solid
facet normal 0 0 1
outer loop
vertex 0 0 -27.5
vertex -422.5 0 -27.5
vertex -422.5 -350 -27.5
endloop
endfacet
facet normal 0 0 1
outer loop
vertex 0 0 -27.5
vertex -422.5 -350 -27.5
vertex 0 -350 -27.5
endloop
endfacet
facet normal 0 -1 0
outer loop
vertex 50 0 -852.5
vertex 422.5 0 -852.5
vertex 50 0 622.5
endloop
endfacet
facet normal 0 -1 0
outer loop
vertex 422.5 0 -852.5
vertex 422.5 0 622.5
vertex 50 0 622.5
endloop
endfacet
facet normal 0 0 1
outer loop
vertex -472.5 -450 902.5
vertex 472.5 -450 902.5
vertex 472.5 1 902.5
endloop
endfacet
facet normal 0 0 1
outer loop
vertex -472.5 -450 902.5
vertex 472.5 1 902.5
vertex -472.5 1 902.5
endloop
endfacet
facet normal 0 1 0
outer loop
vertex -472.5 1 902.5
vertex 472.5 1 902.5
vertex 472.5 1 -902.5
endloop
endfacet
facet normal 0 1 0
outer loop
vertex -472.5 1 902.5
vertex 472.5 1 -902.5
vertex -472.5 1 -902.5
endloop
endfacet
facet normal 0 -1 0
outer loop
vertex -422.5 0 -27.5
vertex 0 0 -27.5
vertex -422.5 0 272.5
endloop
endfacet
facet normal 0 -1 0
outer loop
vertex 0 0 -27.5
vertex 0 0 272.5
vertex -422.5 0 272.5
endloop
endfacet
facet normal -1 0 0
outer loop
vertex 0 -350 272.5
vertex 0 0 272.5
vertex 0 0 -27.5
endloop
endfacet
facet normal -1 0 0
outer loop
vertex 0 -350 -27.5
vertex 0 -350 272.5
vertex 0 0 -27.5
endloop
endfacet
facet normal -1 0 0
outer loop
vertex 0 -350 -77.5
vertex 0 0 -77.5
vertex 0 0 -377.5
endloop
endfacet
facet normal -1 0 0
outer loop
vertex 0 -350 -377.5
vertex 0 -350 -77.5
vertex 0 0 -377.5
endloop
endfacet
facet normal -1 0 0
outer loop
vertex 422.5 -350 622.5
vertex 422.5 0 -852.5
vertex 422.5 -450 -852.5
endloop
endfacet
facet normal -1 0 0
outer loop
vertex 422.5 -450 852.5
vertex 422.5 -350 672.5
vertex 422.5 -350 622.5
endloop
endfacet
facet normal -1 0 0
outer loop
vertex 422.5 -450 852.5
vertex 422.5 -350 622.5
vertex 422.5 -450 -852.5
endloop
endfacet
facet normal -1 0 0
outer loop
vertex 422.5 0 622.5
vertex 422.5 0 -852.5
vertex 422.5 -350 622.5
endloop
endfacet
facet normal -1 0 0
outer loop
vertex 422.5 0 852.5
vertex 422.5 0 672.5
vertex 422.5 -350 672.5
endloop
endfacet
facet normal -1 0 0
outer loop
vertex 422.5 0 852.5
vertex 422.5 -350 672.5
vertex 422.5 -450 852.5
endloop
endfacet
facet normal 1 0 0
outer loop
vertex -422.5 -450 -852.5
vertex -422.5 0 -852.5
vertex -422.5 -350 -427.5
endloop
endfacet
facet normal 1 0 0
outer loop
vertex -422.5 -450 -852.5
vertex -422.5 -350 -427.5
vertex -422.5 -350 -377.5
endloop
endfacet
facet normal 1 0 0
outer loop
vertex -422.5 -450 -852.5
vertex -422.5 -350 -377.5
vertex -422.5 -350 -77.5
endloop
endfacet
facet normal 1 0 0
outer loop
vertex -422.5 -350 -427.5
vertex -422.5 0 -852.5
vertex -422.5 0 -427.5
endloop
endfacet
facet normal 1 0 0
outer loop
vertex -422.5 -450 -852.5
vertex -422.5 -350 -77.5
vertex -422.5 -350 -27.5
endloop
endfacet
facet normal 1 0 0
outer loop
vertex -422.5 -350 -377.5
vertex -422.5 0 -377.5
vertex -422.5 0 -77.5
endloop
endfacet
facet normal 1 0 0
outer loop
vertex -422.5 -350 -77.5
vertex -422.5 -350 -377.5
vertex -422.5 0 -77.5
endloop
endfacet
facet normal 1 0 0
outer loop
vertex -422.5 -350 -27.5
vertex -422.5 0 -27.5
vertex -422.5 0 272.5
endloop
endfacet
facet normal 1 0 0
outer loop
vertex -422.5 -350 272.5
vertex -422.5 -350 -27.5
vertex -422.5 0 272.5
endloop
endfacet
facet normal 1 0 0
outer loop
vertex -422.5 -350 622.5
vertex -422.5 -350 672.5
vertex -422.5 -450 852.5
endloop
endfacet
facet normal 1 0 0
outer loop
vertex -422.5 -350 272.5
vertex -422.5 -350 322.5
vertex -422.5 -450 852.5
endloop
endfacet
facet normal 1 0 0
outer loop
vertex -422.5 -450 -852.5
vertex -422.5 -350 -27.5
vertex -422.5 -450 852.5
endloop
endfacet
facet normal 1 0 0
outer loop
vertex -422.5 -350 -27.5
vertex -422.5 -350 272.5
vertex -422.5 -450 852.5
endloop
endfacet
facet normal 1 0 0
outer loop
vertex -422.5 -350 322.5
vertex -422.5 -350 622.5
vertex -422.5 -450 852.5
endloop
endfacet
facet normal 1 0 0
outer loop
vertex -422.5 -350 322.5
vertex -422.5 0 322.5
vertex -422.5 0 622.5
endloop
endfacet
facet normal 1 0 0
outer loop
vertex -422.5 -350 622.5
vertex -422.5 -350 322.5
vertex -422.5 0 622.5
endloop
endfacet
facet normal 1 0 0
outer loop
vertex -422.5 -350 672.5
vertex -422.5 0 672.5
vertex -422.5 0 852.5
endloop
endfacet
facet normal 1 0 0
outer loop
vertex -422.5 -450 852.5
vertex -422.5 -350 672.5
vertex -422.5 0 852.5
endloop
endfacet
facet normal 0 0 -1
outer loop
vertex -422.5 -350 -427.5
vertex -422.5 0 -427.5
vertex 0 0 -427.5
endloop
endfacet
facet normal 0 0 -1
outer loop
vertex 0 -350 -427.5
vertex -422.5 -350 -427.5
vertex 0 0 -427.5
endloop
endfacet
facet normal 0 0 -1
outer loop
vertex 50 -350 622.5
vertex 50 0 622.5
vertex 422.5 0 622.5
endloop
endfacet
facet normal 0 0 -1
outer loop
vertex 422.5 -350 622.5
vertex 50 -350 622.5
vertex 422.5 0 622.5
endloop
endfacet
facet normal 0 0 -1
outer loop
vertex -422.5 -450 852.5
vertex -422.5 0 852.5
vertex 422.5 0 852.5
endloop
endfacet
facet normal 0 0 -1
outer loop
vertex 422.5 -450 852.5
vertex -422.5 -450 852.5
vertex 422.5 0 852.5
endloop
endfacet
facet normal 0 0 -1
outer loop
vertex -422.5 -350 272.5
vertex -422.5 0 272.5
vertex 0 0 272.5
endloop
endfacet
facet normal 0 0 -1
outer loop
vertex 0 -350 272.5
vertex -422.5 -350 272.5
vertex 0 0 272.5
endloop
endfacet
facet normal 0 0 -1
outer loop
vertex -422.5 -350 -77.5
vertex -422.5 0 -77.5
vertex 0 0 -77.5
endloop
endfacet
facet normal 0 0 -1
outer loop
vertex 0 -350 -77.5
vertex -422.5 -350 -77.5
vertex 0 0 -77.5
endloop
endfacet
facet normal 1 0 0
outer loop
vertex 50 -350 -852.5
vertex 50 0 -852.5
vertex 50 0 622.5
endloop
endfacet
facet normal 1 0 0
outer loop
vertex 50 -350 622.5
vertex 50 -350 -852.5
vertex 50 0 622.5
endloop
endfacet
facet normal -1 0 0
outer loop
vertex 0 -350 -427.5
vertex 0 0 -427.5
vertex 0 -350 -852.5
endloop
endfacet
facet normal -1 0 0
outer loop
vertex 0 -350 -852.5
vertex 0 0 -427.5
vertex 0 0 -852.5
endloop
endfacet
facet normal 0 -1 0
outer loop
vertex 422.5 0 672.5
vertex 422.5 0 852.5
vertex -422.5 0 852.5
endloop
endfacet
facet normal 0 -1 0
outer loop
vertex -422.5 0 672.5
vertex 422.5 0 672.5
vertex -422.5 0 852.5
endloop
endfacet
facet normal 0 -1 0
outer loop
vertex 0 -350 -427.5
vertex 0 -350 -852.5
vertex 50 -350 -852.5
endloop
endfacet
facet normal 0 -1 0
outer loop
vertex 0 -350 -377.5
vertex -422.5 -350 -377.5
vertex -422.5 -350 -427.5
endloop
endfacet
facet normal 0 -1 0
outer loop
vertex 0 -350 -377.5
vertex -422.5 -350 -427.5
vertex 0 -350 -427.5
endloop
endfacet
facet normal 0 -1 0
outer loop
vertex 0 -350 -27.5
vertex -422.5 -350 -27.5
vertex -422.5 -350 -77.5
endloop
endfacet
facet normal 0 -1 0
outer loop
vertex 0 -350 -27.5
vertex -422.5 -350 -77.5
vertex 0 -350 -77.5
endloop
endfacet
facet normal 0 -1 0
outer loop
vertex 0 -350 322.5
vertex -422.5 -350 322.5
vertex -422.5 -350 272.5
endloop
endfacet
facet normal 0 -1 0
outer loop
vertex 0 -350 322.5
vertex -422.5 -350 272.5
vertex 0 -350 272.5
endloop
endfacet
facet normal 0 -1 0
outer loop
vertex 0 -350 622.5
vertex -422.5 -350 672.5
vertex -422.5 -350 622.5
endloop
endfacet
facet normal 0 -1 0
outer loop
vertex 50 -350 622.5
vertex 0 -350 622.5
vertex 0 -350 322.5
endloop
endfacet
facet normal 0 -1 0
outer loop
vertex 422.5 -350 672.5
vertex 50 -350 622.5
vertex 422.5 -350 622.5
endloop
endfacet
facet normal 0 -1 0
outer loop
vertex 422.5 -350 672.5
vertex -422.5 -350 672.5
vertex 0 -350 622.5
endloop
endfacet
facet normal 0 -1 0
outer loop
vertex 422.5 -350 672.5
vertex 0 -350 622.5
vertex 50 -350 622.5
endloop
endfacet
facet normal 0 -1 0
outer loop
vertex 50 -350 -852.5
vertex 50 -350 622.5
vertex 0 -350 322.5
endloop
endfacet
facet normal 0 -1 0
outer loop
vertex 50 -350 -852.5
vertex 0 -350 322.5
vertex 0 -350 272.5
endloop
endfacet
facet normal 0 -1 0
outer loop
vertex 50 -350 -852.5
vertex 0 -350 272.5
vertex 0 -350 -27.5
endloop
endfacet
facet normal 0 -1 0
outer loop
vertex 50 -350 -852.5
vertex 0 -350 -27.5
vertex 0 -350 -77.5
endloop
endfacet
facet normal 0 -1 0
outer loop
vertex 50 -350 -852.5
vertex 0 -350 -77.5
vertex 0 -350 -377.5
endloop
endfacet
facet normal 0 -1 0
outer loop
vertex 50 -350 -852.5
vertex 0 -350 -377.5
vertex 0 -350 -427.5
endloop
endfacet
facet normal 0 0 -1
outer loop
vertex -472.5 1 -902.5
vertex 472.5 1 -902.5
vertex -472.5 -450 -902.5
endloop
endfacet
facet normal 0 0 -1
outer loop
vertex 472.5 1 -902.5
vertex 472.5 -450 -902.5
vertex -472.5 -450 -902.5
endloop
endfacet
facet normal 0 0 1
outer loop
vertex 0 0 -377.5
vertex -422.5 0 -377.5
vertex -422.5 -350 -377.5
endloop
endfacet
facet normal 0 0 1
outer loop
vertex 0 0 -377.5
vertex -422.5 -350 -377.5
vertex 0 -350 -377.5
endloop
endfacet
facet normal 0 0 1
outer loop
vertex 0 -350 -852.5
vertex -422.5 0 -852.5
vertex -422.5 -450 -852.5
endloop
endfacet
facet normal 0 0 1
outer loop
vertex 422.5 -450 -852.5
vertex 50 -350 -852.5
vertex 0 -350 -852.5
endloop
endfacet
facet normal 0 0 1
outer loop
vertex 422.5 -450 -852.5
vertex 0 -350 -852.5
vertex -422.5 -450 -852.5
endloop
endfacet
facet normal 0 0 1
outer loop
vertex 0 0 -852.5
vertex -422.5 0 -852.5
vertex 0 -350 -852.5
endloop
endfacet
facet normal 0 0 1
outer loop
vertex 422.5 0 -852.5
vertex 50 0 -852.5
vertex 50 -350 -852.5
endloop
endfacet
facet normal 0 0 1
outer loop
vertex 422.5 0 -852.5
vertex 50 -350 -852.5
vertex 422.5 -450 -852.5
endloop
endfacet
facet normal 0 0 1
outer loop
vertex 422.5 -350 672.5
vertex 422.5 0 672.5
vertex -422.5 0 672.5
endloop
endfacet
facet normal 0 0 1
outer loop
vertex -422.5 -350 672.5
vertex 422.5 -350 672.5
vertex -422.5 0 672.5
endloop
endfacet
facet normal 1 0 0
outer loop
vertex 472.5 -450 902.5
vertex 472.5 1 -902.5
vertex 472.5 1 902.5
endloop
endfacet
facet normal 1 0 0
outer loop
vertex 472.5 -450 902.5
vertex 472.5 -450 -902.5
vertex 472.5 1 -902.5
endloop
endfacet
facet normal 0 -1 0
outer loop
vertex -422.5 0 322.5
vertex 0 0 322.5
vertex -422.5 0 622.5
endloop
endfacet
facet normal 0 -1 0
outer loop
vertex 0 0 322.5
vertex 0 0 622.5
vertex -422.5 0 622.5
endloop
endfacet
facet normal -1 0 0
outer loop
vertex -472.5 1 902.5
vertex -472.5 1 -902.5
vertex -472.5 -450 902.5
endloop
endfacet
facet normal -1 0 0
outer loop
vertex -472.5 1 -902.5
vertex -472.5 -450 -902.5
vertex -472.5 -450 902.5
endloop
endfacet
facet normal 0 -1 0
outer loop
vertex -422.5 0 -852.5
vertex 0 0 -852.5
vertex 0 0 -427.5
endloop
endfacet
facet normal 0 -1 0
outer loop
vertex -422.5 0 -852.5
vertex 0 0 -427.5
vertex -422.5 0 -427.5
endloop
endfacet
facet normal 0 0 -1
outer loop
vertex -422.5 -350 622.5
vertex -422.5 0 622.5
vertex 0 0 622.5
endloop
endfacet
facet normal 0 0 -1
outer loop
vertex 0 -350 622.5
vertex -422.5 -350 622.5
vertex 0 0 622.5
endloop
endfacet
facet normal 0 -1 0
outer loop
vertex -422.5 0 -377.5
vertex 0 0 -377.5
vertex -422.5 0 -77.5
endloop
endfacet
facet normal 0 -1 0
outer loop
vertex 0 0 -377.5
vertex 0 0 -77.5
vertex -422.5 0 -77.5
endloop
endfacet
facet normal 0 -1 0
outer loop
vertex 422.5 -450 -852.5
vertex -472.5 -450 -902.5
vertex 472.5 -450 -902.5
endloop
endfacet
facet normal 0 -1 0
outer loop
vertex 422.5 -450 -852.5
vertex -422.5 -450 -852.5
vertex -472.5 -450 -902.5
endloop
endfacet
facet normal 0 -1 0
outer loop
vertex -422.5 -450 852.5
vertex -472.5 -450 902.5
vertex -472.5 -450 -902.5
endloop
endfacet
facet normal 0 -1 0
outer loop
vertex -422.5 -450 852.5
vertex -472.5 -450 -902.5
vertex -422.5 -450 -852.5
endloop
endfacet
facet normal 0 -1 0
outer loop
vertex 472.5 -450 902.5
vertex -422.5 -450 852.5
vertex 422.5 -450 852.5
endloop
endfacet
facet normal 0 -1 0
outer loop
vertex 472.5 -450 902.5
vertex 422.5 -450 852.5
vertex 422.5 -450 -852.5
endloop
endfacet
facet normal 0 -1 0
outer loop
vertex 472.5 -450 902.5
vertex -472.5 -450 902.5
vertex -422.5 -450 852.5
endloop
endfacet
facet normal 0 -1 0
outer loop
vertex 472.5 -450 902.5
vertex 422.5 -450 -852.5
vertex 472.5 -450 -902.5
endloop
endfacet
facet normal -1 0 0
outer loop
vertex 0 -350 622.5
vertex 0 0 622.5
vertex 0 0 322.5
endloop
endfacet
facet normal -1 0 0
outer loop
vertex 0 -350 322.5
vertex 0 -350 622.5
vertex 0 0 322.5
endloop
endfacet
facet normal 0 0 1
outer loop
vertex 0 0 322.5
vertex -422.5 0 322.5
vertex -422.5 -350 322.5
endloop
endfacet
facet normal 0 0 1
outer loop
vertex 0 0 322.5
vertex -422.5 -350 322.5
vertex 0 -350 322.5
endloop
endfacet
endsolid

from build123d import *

# Parameters (mm, degrees)
F0_W     = 945
F0_H     = 1805
F0_W_2   = 845
F0_H_2   = 1705
F1_DEPTH = 450
F2_W     = 945
F2_H     = 1805
F3_DEPTH = 1
F4_W     = 422.5
F4_H     = 50
F5_DEPTH = 350


with BuildPart() as f1:
    # F0 (on Front) → F1 (new body)
    with BuildSketch(Plane.XZ):
        Rectangle(F0_W, F0_H)
        Rectangle(F0_W_2, F0_H_2, mode=Mode.SUBTRACT)
    extrude(amount=F1_DEPTH)

    # F2 (on face) → F3 (join)
    with BuildSketch(Plane(origin=(0, 0, 0), x_dir=(-1, 0, 0), z_dir=(0, 1, 0))):
        Rectangle(F2_W, F2_H)
    extrude(amount=F3_DEPTH)

    # F4 (on face) → F5 (join)
    with BuildSketch(Plane.XZ):
        Polygon((422.5, 672.5), (-422.5, 672.5), (-422.5, 622.5), (0, 622.5), (50, 622.5), (422.5, 622.5), align=None)
        Polygon((50, 622.5), (0, 622.5), (0, 322.5), (0, 272.5), (0, -27.5), (0, -77.5), (0, -377.5), (0, -427.5), (0, -852.5), (50, -852.5), align=None)
        with Locations((-211.25, 297.5)):
            Rectangle(F4_W, F4_H)
        with Locations((-211.25, -52.5)):
            Rectangle(F4_W, F4_H)
        with Locations((-211.25, -402.5)):
            Rectangle(F4_W, F4_H)
    extrude(amount=F5_DEPTH)


solid = f1.part
